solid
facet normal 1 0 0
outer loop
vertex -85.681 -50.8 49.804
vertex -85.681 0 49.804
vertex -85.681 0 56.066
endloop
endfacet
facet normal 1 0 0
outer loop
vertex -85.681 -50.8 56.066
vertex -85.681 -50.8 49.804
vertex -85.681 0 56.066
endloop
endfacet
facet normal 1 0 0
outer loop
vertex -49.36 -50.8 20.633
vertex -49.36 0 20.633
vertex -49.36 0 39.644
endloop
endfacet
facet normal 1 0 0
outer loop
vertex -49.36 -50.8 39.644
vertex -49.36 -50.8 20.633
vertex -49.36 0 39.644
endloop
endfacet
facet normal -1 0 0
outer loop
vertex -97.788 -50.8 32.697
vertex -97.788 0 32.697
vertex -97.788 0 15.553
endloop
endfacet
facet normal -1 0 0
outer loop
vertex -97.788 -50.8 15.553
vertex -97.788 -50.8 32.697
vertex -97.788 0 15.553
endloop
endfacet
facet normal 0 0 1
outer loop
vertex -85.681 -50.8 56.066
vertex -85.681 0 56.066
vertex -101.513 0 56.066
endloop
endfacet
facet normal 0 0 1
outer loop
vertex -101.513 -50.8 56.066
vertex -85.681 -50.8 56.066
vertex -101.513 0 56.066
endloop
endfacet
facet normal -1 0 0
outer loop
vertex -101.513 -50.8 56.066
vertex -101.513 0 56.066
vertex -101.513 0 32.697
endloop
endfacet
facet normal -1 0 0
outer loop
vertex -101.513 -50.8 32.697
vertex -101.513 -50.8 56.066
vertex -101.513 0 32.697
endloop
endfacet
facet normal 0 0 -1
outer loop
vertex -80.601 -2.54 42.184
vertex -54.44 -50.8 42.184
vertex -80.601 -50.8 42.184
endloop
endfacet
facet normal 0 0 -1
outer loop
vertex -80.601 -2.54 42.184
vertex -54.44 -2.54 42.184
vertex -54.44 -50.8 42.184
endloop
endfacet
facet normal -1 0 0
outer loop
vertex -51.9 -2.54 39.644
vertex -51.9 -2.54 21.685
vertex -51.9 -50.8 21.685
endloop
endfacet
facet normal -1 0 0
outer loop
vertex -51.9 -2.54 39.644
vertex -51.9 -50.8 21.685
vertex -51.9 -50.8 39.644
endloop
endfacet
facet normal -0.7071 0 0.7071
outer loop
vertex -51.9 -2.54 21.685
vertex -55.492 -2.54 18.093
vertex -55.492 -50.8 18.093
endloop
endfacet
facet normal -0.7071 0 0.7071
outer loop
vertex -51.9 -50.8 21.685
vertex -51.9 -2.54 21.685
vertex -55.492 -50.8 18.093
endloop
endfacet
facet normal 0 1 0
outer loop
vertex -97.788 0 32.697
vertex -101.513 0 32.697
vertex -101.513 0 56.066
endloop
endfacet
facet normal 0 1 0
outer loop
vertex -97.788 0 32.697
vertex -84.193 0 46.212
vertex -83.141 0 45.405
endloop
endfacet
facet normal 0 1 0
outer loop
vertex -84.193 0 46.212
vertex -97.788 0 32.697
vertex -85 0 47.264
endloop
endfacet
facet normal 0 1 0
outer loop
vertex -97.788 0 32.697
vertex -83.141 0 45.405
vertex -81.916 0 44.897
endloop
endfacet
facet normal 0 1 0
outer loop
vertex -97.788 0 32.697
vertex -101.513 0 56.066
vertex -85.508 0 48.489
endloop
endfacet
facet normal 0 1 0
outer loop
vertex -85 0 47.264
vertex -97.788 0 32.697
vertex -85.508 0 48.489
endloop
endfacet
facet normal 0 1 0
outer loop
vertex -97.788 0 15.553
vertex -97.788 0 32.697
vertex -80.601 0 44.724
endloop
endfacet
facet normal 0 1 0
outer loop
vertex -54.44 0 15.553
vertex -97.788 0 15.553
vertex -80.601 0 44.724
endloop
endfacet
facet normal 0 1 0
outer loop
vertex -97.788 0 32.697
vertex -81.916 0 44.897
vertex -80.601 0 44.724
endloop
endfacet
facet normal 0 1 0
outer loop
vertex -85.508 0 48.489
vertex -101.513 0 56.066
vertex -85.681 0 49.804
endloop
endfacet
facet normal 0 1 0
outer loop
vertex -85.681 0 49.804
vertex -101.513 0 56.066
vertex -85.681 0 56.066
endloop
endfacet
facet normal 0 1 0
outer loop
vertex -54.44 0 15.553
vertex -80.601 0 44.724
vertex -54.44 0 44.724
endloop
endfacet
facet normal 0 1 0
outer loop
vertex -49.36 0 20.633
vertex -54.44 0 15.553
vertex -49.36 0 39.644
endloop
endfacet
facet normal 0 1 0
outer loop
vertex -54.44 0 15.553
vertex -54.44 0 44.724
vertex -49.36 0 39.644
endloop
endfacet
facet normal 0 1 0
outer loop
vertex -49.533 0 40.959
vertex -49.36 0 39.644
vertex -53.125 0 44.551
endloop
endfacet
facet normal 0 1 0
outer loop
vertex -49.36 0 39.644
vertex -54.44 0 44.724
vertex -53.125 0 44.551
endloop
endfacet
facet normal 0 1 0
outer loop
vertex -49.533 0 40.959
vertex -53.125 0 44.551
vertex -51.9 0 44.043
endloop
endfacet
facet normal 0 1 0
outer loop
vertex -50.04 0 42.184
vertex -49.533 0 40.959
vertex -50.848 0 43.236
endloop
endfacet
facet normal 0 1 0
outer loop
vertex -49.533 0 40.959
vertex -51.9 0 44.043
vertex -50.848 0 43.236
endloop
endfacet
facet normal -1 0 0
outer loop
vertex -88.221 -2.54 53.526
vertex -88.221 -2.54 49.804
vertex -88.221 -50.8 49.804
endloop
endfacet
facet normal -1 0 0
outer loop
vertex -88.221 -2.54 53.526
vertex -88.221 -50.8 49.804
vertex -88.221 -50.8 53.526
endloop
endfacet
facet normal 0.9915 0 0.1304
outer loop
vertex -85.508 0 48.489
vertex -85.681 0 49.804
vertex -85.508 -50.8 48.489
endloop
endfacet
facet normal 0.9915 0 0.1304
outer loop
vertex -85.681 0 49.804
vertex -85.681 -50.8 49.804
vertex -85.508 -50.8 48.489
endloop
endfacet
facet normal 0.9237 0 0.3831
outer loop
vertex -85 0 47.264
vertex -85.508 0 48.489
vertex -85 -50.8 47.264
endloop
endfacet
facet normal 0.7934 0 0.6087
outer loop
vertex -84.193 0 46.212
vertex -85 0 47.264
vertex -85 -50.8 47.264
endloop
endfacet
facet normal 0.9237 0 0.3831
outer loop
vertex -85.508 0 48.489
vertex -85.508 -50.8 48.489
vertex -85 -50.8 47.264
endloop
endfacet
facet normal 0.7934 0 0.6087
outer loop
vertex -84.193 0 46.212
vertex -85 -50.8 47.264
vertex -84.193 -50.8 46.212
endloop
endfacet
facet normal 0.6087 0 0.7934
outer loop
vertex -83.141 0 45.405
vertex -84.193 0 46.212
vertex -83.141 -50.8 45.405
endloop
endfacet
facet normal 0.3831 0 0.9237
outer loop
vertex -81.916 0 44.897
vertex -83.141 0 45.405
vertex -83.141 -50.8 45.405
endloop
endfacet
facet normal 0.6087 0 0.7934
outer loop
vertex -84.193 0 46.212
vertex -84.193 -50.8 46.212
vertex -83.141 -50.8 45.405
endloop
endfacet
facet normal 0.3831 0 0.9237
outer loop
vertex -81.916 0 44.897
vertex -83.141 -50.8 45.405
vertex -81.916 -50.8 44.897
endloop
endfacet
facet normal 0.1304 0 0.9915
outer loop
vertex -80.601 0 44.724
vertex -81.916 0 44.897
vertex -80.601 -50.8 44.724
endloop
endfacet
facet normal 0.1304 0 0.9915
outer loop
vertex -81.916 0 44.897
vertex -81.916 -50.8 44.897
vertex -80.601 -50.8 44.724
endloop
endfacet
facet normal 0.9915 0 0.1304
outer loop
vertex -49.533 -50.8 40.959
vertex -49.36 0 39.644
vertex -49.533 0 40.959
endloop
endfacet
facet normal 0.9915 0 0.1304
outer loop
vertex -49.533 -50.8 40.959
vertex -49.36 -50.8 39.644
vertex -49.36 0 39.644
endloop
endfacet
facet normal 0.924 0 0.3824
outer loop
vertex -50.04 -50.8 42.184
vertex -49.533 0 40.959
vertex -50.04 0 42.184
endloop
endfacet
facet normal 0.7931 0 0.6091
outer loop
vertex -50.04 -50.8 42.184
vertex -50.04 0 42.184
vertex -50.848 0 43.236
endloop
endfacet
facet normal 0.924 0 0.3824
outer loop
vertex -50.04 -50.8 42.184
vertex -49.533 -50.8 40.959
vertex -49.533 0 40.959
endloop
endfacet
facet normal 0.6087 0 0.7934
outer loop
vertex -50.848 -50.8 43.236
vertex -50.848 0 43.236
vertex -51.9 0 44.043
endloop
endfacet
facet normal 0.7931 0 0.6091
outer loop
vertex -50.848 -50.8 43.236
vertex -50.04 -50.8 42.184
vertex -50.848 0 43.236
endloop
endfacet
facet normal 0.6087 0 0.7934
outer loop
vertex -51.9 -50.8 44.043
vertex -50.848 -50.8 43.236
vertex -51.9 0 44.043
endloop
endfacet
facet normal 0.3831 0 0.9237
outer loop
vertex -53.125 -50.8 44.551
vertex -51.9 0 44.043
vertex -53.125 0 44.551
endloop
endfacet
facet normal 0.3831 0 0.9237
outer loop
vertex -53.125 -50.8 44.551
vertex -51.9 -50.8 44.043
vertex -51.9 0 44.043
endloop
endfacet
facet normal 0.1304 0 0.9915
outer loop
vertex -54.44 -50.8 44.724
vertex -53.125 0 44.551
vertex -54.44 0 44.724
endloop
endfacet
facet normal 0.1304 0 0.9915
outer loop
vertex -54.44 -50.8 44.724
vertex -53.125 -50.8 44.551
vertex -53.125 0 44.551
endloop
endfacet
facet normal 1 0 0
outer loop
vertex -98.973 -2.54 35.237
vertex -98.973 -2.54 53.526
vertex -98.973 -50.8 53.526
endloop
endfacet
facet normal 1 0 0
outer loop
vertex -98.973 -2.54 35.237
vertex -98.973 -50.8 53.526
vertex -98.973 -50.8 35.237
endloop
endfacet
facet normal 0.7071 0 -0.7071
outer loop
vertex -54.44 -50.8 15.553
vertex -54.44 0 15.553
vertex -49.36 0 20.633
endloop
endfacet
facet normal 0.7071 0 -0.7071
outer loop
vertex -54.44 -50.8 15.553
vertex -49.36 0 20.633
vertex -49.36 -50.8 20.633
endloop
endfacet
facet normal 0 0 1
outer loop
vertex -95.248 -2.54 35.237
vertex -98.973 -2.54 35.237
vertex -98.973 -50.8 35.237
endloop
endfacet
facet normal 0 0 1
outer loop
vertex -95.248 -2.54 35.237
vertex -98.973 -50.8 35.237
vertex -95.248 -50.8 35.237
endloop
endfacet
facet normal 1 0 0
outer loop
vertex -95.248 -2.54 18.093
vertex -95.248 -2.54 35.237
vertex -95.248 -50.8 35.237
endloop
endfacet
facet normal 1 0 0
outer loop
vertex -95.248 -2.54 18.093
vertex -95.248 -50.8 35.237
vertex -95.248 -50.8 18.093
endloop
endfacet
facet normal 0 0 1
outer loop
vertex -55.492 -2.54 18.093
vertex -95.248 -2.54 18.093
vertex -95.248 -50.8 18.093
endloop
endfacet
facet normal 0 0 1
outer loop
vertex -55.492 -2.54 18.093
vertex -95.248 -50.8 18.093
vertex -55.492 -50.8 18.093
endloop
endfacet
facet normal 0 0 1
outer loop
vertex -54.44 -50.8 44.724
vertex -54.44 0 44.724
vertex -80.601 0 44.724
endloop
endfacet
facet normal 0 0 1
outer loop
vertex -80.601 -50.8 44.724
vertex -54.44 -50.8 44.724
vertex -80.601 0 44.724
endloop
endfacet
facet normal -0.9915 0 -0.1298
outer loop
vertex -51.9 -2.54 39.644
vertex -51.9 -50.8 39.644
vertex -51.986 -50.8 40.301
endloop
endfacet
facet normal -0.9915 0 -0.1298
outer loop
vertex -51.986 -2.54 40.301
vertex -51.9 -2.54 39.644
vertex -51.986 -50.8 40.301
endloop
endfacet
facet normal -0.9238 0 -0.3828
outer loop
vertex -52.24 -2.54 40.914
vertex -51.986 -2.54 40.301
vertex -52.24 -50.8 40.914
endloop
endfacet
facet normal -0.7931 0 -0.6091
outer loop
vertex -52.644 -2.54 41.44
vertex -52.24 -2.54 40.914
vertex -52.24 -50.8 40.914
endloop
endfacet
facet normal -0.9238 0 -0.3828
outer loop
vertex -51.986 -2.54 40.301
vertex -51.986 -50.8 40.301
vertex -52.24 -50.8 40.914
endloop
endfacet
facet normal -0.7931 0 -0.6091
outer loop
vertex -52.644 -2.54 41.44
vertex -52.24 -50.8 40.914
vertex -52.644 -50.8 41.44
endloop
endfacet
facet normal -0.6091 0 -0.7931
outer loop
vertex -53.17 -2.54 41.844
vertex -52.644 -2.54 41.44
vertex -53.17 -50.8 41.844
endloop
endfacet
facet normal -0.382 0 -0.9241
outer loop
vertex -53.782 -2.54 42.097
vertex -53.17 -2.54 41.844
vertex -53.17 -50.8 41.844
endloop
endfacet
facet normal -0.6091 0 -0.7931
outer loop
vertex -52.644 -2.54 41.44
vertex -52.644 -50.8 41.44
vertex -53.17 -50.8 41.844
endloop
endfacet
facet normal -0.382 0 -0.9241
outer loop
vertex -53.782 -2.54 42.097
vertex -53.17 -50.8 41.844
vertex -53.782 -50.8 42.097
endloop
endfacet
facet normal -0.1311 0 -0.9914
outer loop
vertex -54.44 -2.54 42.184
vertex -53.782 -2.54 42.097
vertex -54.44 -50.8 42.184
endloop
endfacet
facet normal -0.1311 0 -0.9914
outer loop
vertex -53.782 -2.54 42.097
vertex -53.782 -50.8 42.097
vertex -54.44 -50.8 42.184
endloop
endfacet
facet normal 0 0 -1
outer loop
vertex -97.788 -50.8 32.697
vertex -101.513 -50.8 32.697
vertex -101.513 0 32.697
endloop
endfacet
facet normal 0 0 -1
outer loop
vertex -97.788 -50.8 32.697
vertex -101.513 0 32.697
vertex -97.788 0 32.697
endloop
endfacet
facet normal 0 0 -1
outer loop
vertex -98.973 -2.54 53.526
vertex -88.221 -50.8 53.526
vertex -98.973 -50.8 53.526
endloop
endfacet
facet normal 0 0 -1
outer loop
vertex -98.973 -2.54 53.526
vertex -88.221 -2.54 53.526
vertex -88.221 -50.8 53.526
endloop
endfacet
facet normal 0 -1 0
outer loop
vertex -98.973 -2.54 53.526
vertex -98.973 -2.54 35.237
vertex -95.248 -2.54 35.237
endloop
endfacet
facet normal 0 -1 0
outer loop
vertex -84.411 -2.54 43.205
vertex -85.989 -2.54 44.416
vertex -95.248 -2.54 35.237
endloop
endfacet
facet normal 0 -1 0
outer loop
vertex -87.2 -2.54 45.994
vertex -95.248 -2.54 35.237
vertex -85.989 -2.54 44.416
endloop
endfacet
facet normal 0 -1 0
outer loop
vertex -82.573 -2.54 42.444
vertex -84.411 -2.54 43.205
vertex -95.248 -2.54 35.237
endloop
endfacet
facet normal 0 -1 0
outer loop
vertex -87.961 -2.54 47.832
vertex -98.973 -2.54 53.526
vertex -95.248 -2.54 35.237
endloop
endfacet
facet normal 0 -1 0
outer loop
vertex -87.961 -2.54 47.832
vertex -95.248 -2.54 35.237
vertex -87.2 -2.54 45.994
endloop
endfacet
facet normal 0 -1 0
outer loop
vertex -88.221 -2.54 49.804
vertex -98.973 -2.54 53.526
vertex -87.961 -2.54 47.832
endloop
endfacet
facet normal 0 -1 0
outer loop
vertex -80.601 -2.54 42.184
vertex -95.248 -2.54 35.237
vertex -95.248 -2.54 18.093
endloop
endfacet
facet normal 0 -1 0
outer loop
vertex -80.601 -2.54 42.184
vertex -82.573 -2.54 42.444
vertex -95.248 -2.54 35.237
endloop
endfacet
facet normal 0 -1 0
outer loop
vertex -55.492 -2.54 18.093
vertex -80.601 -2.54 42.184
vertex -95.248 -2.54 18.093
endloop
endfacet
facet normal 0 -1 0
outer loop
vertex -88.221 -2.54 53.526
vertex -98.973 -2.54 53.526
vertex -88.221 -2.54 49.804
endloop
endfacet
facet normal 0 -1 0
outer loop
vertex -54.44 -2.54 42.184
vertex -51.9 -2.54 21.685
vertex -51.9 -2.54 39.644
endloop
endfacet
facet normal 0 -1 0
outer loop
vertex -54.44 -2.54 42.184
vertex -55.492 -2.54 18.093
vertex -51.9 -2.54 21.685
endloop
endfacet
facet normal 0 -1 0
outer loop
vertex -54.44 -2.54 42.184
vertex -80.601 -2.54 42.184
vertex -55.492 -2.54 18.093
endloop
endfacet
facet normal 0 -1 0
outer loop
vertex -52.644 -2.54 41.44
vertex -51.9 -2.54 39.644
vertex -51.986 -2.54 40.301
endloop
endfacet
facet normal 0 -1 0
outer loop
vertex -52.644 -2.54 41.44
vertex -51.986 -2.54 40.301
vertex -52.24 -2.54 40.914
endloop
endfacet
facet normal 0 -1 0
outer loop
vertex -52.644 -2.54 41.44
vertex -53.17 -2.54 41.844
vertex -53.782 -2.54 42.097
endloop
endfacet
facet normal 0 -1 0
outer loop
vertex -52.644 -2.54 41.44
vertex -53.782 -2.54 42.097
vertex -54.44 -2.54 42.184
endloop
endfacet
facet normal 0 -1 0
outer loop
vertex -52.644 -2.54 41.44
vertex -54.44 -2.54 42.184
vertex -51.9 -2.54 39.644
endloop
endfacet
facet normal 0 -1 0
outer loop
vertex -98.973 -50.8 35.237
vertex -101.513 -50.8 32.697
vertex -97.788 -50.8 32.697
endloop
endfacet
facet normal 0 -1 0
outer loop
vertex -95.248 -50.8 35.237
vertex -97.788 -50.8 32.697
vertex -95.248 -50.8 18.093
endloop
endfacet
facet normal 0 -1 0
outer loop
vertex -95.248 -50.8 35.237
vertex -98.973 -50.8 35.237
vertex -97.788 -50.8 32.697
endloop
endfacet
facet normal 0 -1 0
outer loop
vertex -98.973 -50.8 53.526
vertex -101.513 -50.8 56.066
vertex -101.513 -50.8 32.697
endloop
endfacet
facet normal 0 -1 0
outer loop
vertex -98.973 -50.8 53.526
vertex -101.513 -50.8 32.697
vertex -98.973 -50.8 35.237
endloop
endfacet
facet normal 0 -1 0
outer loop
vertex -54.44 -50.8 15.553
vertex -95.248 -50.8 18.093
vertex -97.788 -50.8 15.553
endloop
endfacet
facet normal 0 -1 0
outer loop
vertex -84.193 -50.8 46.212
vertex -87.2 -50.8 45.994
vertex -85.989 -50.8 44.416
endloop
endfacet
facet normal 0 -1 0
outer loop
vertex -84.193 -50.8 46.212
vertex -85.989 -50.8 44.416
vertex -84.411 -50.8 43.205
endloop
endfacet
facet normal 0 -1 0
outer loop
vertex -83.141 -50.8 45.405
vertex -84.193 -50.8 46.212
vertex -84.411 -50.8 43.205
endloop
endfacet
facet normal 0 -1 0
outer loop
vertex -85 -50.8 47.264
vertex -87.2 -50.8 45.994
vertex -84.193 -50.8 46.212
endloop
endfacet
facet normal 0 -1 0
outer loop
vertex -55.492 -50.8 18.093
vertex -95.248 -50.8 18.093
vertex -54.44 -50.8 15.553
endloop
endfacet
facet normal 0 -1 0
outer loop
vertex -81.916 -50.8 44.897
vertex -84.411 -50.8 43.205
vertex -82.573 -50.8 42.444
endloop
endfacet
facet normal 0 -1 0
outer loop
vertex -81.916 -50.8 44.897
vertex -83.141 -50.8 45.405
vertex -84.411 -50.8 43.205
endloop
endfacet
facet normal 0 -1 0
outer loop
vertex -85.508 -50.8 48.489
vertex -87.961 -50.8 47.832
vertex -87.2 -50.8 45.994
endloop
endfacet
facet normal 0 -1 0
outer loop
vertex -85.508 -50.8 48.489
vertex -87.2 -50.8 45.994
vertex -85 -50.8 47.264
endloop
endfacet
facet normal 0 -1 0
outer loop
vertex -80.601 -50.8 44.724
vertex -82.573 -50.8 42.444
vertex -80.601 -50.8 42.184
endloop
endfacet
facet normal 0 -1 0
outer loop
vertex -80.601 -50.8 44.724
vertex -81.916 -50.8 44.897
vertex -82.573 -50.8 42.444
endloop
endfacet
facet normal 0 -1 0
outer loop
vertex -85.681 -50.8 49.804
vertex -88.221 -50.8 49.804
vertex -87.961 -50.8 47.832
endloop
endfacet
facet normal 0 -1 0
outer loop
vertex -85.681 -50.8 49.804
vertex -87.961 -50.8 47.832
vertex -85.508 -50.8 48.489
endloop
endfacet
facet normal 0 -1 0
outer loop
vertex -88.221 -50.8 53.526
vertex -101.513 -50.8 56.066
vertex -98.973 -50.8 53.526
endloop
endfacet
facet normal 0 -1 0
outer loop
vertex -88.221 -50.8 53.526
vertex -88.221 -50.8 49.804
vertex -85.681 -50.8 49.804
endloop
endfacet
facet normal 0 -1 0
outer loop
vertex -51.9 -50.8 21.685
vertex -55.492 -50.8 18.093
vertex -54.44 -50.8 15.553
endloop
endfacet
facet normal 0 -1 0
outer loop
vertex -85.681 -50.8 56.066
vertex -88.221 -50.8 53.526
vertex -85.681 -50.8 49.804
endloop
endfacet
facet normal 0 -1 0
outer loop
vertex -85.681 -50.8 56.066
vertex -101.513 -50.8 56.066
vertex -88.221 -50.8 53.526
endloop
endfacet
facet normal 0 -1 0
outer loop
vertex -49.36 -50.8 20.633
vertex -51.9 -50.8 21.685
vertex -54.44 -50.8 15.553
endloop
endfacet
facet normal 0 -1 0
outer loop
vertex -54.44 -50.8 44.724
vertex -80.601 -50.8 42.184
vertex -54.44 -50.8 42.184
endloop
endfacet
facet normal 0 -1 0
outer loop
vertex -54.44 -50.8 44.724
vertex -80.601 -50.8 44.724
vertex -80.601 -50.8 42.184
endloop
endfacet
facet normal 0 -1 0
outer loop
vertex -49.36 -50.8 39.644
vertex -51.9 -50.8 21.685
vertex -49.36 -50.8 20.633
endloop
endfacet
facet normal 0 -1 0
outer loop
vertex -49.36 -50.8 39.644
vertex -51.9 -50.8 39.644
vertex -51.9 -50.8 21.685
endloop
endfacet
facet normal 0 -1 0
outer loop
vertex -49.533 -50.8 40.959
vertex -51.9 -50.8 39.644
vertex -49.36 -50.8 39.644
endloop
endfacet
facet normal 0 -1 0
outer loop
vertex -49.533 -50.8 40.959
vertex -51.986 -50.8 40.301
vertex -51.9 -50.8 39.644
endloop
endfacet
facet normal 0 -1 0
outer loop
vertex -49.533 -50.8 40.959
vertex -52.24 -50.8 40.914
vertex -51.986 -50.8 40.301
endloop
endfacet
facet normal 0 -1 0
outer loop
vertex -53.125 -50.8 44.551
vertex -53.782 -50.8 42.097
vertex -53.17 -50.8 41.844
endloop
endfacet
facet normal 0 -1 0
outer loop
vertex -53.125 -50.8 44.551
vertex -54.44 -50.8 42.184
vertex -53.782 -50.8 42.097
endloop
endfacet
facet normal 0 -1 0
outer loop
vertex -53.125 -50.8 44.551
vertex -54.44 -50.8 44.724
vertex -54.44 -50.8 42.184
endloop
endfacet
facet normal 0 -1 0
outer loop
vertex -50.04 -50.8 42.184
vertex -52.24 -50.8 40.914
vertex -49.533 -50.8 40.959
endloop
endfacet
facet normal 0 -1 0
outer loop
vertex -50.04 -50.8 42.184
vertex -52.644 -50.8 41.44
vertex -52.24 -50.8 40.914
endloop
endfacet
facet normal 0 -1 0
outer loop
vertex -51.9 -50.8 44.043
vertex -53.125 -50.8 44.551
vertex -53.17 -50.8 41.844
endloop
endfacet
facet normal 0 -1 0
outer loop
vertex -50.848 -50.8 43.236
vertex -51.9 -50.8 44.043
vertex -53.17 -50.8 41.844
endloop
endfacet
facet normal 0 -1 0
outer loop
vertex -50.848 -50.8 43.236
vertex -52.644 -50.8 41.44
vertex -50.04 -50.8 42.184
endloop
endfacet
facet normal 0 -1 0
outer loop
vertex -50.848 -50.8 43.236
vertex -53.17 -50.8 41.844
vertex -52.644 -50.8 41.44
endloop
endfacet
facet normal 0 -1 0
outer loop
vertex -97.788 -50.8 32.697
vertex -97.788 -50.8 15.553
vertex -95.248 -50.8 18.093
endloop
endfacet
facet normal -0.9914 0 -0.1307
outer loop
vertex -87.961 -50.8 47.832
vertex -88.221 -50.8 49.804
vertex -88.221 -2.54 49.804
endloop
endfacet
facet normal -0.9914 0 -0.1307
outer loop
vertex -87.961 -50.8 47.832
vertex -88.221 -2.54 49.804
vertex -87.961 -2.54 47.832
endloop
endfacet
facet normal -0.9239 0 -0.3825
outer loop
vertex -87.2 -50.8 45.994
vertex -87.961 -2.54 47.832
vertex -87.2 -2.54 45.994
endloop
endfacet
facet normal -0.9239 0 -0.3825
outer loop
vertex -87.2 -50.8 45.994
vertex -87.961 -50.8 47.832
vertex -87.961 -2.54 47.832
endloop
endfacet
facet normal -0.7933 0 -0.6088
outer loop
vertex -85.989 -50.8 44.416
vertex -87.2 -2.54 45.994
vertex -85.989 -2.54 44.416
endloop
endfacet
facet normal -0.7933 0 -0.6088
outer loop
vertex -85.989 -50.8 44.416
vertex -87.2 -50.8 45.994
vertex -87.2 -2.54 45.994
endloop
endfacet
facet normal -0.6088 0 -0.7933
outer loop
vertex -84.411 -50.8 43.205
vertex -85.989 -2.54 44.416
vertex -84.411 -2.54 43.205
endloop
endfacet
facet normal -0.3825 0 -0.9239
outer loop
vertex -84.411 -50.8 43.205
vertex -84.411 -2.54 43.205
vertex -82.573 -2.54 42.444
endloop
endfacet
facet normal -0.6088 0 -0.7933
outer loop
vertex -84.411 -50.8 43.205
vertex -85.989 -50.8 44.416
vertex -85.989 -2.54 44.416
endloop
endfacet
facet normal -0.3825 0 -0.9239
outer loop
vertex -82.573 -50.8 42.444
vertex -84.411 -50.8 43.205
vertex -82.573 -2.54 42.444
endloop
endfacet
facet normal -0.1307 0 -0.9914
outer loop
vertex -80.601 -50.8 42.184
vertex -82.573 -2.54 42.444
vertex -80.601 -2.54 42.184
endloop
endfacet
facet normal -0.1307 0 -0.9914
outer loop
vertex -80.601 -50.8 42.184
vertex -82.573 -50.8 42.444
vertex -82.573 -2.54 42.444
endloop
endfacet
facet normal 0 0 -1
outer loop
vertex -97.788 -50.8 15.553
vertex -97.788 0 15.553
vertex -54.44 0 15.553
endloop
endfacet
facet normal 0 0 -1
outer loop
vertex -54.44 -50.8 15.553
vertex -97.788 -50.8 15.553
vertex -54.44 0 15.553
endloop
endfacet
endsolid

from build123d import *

# Parameters (mm, degrees)
F0_W     = 12.1070817113
F0_H     = 12.026887387
F1_DEPTH = 50.8
F2_R     = 5.08
F3_SIZE  = 5.08
F4_T     = -2.54


with BuildPart() as f1:
    # F0 (on Front) → F1 (new body)
    with BuildSketch(Plane.XZ):
        Polygon((-97.7879613638, 32.6970815659), (-97.7879613638, 44.7239689529), (-85.6808796525, 44.7239689529), (-85.6808796525, 56.0660995543), (-101.5132069588, 56.0660995543), (-101.5132069588, 32.6970815659), align=None)
        with Locations((-91.7344205081, 38.7105252594)):
            Rectangle(F0_W, F0_H)
        Polygon((-49.3596345186, 44.7239689529), (-85.6808796525, 44.7239689529), (-85.6808796525, 32.6970815659), (-97.7879613638, 32.6970815659), (-97.7879613638, 15.5531428754), (-49.3596345186, 15.5531428754), align=None)
    extrude(amount=F1_DEPTH)

    # F2
    f2_edges = [f1.edges().sort_by_distance(p)[0] for p in [
        (-85.68088, -25.4, 44.723969),
        (-49.359635, -25.4, 44.723969),
    ]]
    fillet(f2_edges, radius=F2_R)

    # F3
    f3_edges = [f1.edges().sort_by_distance(p)[0] for p in [
        (-49.359635, -25.4, 15.553143),
    ]]
    chamfer(f3_edges, length=F3_SIZE)

    # F4
    f4_openings = [f1.faces().sort_by_distance(p)[0] for p in [
        (-76.801986, -50.8, 32.724788),
    ]]
    offset(amount=F4_T, openings=f4_openings, kind=Kind.INTERSECTION)


solid = f1.part
